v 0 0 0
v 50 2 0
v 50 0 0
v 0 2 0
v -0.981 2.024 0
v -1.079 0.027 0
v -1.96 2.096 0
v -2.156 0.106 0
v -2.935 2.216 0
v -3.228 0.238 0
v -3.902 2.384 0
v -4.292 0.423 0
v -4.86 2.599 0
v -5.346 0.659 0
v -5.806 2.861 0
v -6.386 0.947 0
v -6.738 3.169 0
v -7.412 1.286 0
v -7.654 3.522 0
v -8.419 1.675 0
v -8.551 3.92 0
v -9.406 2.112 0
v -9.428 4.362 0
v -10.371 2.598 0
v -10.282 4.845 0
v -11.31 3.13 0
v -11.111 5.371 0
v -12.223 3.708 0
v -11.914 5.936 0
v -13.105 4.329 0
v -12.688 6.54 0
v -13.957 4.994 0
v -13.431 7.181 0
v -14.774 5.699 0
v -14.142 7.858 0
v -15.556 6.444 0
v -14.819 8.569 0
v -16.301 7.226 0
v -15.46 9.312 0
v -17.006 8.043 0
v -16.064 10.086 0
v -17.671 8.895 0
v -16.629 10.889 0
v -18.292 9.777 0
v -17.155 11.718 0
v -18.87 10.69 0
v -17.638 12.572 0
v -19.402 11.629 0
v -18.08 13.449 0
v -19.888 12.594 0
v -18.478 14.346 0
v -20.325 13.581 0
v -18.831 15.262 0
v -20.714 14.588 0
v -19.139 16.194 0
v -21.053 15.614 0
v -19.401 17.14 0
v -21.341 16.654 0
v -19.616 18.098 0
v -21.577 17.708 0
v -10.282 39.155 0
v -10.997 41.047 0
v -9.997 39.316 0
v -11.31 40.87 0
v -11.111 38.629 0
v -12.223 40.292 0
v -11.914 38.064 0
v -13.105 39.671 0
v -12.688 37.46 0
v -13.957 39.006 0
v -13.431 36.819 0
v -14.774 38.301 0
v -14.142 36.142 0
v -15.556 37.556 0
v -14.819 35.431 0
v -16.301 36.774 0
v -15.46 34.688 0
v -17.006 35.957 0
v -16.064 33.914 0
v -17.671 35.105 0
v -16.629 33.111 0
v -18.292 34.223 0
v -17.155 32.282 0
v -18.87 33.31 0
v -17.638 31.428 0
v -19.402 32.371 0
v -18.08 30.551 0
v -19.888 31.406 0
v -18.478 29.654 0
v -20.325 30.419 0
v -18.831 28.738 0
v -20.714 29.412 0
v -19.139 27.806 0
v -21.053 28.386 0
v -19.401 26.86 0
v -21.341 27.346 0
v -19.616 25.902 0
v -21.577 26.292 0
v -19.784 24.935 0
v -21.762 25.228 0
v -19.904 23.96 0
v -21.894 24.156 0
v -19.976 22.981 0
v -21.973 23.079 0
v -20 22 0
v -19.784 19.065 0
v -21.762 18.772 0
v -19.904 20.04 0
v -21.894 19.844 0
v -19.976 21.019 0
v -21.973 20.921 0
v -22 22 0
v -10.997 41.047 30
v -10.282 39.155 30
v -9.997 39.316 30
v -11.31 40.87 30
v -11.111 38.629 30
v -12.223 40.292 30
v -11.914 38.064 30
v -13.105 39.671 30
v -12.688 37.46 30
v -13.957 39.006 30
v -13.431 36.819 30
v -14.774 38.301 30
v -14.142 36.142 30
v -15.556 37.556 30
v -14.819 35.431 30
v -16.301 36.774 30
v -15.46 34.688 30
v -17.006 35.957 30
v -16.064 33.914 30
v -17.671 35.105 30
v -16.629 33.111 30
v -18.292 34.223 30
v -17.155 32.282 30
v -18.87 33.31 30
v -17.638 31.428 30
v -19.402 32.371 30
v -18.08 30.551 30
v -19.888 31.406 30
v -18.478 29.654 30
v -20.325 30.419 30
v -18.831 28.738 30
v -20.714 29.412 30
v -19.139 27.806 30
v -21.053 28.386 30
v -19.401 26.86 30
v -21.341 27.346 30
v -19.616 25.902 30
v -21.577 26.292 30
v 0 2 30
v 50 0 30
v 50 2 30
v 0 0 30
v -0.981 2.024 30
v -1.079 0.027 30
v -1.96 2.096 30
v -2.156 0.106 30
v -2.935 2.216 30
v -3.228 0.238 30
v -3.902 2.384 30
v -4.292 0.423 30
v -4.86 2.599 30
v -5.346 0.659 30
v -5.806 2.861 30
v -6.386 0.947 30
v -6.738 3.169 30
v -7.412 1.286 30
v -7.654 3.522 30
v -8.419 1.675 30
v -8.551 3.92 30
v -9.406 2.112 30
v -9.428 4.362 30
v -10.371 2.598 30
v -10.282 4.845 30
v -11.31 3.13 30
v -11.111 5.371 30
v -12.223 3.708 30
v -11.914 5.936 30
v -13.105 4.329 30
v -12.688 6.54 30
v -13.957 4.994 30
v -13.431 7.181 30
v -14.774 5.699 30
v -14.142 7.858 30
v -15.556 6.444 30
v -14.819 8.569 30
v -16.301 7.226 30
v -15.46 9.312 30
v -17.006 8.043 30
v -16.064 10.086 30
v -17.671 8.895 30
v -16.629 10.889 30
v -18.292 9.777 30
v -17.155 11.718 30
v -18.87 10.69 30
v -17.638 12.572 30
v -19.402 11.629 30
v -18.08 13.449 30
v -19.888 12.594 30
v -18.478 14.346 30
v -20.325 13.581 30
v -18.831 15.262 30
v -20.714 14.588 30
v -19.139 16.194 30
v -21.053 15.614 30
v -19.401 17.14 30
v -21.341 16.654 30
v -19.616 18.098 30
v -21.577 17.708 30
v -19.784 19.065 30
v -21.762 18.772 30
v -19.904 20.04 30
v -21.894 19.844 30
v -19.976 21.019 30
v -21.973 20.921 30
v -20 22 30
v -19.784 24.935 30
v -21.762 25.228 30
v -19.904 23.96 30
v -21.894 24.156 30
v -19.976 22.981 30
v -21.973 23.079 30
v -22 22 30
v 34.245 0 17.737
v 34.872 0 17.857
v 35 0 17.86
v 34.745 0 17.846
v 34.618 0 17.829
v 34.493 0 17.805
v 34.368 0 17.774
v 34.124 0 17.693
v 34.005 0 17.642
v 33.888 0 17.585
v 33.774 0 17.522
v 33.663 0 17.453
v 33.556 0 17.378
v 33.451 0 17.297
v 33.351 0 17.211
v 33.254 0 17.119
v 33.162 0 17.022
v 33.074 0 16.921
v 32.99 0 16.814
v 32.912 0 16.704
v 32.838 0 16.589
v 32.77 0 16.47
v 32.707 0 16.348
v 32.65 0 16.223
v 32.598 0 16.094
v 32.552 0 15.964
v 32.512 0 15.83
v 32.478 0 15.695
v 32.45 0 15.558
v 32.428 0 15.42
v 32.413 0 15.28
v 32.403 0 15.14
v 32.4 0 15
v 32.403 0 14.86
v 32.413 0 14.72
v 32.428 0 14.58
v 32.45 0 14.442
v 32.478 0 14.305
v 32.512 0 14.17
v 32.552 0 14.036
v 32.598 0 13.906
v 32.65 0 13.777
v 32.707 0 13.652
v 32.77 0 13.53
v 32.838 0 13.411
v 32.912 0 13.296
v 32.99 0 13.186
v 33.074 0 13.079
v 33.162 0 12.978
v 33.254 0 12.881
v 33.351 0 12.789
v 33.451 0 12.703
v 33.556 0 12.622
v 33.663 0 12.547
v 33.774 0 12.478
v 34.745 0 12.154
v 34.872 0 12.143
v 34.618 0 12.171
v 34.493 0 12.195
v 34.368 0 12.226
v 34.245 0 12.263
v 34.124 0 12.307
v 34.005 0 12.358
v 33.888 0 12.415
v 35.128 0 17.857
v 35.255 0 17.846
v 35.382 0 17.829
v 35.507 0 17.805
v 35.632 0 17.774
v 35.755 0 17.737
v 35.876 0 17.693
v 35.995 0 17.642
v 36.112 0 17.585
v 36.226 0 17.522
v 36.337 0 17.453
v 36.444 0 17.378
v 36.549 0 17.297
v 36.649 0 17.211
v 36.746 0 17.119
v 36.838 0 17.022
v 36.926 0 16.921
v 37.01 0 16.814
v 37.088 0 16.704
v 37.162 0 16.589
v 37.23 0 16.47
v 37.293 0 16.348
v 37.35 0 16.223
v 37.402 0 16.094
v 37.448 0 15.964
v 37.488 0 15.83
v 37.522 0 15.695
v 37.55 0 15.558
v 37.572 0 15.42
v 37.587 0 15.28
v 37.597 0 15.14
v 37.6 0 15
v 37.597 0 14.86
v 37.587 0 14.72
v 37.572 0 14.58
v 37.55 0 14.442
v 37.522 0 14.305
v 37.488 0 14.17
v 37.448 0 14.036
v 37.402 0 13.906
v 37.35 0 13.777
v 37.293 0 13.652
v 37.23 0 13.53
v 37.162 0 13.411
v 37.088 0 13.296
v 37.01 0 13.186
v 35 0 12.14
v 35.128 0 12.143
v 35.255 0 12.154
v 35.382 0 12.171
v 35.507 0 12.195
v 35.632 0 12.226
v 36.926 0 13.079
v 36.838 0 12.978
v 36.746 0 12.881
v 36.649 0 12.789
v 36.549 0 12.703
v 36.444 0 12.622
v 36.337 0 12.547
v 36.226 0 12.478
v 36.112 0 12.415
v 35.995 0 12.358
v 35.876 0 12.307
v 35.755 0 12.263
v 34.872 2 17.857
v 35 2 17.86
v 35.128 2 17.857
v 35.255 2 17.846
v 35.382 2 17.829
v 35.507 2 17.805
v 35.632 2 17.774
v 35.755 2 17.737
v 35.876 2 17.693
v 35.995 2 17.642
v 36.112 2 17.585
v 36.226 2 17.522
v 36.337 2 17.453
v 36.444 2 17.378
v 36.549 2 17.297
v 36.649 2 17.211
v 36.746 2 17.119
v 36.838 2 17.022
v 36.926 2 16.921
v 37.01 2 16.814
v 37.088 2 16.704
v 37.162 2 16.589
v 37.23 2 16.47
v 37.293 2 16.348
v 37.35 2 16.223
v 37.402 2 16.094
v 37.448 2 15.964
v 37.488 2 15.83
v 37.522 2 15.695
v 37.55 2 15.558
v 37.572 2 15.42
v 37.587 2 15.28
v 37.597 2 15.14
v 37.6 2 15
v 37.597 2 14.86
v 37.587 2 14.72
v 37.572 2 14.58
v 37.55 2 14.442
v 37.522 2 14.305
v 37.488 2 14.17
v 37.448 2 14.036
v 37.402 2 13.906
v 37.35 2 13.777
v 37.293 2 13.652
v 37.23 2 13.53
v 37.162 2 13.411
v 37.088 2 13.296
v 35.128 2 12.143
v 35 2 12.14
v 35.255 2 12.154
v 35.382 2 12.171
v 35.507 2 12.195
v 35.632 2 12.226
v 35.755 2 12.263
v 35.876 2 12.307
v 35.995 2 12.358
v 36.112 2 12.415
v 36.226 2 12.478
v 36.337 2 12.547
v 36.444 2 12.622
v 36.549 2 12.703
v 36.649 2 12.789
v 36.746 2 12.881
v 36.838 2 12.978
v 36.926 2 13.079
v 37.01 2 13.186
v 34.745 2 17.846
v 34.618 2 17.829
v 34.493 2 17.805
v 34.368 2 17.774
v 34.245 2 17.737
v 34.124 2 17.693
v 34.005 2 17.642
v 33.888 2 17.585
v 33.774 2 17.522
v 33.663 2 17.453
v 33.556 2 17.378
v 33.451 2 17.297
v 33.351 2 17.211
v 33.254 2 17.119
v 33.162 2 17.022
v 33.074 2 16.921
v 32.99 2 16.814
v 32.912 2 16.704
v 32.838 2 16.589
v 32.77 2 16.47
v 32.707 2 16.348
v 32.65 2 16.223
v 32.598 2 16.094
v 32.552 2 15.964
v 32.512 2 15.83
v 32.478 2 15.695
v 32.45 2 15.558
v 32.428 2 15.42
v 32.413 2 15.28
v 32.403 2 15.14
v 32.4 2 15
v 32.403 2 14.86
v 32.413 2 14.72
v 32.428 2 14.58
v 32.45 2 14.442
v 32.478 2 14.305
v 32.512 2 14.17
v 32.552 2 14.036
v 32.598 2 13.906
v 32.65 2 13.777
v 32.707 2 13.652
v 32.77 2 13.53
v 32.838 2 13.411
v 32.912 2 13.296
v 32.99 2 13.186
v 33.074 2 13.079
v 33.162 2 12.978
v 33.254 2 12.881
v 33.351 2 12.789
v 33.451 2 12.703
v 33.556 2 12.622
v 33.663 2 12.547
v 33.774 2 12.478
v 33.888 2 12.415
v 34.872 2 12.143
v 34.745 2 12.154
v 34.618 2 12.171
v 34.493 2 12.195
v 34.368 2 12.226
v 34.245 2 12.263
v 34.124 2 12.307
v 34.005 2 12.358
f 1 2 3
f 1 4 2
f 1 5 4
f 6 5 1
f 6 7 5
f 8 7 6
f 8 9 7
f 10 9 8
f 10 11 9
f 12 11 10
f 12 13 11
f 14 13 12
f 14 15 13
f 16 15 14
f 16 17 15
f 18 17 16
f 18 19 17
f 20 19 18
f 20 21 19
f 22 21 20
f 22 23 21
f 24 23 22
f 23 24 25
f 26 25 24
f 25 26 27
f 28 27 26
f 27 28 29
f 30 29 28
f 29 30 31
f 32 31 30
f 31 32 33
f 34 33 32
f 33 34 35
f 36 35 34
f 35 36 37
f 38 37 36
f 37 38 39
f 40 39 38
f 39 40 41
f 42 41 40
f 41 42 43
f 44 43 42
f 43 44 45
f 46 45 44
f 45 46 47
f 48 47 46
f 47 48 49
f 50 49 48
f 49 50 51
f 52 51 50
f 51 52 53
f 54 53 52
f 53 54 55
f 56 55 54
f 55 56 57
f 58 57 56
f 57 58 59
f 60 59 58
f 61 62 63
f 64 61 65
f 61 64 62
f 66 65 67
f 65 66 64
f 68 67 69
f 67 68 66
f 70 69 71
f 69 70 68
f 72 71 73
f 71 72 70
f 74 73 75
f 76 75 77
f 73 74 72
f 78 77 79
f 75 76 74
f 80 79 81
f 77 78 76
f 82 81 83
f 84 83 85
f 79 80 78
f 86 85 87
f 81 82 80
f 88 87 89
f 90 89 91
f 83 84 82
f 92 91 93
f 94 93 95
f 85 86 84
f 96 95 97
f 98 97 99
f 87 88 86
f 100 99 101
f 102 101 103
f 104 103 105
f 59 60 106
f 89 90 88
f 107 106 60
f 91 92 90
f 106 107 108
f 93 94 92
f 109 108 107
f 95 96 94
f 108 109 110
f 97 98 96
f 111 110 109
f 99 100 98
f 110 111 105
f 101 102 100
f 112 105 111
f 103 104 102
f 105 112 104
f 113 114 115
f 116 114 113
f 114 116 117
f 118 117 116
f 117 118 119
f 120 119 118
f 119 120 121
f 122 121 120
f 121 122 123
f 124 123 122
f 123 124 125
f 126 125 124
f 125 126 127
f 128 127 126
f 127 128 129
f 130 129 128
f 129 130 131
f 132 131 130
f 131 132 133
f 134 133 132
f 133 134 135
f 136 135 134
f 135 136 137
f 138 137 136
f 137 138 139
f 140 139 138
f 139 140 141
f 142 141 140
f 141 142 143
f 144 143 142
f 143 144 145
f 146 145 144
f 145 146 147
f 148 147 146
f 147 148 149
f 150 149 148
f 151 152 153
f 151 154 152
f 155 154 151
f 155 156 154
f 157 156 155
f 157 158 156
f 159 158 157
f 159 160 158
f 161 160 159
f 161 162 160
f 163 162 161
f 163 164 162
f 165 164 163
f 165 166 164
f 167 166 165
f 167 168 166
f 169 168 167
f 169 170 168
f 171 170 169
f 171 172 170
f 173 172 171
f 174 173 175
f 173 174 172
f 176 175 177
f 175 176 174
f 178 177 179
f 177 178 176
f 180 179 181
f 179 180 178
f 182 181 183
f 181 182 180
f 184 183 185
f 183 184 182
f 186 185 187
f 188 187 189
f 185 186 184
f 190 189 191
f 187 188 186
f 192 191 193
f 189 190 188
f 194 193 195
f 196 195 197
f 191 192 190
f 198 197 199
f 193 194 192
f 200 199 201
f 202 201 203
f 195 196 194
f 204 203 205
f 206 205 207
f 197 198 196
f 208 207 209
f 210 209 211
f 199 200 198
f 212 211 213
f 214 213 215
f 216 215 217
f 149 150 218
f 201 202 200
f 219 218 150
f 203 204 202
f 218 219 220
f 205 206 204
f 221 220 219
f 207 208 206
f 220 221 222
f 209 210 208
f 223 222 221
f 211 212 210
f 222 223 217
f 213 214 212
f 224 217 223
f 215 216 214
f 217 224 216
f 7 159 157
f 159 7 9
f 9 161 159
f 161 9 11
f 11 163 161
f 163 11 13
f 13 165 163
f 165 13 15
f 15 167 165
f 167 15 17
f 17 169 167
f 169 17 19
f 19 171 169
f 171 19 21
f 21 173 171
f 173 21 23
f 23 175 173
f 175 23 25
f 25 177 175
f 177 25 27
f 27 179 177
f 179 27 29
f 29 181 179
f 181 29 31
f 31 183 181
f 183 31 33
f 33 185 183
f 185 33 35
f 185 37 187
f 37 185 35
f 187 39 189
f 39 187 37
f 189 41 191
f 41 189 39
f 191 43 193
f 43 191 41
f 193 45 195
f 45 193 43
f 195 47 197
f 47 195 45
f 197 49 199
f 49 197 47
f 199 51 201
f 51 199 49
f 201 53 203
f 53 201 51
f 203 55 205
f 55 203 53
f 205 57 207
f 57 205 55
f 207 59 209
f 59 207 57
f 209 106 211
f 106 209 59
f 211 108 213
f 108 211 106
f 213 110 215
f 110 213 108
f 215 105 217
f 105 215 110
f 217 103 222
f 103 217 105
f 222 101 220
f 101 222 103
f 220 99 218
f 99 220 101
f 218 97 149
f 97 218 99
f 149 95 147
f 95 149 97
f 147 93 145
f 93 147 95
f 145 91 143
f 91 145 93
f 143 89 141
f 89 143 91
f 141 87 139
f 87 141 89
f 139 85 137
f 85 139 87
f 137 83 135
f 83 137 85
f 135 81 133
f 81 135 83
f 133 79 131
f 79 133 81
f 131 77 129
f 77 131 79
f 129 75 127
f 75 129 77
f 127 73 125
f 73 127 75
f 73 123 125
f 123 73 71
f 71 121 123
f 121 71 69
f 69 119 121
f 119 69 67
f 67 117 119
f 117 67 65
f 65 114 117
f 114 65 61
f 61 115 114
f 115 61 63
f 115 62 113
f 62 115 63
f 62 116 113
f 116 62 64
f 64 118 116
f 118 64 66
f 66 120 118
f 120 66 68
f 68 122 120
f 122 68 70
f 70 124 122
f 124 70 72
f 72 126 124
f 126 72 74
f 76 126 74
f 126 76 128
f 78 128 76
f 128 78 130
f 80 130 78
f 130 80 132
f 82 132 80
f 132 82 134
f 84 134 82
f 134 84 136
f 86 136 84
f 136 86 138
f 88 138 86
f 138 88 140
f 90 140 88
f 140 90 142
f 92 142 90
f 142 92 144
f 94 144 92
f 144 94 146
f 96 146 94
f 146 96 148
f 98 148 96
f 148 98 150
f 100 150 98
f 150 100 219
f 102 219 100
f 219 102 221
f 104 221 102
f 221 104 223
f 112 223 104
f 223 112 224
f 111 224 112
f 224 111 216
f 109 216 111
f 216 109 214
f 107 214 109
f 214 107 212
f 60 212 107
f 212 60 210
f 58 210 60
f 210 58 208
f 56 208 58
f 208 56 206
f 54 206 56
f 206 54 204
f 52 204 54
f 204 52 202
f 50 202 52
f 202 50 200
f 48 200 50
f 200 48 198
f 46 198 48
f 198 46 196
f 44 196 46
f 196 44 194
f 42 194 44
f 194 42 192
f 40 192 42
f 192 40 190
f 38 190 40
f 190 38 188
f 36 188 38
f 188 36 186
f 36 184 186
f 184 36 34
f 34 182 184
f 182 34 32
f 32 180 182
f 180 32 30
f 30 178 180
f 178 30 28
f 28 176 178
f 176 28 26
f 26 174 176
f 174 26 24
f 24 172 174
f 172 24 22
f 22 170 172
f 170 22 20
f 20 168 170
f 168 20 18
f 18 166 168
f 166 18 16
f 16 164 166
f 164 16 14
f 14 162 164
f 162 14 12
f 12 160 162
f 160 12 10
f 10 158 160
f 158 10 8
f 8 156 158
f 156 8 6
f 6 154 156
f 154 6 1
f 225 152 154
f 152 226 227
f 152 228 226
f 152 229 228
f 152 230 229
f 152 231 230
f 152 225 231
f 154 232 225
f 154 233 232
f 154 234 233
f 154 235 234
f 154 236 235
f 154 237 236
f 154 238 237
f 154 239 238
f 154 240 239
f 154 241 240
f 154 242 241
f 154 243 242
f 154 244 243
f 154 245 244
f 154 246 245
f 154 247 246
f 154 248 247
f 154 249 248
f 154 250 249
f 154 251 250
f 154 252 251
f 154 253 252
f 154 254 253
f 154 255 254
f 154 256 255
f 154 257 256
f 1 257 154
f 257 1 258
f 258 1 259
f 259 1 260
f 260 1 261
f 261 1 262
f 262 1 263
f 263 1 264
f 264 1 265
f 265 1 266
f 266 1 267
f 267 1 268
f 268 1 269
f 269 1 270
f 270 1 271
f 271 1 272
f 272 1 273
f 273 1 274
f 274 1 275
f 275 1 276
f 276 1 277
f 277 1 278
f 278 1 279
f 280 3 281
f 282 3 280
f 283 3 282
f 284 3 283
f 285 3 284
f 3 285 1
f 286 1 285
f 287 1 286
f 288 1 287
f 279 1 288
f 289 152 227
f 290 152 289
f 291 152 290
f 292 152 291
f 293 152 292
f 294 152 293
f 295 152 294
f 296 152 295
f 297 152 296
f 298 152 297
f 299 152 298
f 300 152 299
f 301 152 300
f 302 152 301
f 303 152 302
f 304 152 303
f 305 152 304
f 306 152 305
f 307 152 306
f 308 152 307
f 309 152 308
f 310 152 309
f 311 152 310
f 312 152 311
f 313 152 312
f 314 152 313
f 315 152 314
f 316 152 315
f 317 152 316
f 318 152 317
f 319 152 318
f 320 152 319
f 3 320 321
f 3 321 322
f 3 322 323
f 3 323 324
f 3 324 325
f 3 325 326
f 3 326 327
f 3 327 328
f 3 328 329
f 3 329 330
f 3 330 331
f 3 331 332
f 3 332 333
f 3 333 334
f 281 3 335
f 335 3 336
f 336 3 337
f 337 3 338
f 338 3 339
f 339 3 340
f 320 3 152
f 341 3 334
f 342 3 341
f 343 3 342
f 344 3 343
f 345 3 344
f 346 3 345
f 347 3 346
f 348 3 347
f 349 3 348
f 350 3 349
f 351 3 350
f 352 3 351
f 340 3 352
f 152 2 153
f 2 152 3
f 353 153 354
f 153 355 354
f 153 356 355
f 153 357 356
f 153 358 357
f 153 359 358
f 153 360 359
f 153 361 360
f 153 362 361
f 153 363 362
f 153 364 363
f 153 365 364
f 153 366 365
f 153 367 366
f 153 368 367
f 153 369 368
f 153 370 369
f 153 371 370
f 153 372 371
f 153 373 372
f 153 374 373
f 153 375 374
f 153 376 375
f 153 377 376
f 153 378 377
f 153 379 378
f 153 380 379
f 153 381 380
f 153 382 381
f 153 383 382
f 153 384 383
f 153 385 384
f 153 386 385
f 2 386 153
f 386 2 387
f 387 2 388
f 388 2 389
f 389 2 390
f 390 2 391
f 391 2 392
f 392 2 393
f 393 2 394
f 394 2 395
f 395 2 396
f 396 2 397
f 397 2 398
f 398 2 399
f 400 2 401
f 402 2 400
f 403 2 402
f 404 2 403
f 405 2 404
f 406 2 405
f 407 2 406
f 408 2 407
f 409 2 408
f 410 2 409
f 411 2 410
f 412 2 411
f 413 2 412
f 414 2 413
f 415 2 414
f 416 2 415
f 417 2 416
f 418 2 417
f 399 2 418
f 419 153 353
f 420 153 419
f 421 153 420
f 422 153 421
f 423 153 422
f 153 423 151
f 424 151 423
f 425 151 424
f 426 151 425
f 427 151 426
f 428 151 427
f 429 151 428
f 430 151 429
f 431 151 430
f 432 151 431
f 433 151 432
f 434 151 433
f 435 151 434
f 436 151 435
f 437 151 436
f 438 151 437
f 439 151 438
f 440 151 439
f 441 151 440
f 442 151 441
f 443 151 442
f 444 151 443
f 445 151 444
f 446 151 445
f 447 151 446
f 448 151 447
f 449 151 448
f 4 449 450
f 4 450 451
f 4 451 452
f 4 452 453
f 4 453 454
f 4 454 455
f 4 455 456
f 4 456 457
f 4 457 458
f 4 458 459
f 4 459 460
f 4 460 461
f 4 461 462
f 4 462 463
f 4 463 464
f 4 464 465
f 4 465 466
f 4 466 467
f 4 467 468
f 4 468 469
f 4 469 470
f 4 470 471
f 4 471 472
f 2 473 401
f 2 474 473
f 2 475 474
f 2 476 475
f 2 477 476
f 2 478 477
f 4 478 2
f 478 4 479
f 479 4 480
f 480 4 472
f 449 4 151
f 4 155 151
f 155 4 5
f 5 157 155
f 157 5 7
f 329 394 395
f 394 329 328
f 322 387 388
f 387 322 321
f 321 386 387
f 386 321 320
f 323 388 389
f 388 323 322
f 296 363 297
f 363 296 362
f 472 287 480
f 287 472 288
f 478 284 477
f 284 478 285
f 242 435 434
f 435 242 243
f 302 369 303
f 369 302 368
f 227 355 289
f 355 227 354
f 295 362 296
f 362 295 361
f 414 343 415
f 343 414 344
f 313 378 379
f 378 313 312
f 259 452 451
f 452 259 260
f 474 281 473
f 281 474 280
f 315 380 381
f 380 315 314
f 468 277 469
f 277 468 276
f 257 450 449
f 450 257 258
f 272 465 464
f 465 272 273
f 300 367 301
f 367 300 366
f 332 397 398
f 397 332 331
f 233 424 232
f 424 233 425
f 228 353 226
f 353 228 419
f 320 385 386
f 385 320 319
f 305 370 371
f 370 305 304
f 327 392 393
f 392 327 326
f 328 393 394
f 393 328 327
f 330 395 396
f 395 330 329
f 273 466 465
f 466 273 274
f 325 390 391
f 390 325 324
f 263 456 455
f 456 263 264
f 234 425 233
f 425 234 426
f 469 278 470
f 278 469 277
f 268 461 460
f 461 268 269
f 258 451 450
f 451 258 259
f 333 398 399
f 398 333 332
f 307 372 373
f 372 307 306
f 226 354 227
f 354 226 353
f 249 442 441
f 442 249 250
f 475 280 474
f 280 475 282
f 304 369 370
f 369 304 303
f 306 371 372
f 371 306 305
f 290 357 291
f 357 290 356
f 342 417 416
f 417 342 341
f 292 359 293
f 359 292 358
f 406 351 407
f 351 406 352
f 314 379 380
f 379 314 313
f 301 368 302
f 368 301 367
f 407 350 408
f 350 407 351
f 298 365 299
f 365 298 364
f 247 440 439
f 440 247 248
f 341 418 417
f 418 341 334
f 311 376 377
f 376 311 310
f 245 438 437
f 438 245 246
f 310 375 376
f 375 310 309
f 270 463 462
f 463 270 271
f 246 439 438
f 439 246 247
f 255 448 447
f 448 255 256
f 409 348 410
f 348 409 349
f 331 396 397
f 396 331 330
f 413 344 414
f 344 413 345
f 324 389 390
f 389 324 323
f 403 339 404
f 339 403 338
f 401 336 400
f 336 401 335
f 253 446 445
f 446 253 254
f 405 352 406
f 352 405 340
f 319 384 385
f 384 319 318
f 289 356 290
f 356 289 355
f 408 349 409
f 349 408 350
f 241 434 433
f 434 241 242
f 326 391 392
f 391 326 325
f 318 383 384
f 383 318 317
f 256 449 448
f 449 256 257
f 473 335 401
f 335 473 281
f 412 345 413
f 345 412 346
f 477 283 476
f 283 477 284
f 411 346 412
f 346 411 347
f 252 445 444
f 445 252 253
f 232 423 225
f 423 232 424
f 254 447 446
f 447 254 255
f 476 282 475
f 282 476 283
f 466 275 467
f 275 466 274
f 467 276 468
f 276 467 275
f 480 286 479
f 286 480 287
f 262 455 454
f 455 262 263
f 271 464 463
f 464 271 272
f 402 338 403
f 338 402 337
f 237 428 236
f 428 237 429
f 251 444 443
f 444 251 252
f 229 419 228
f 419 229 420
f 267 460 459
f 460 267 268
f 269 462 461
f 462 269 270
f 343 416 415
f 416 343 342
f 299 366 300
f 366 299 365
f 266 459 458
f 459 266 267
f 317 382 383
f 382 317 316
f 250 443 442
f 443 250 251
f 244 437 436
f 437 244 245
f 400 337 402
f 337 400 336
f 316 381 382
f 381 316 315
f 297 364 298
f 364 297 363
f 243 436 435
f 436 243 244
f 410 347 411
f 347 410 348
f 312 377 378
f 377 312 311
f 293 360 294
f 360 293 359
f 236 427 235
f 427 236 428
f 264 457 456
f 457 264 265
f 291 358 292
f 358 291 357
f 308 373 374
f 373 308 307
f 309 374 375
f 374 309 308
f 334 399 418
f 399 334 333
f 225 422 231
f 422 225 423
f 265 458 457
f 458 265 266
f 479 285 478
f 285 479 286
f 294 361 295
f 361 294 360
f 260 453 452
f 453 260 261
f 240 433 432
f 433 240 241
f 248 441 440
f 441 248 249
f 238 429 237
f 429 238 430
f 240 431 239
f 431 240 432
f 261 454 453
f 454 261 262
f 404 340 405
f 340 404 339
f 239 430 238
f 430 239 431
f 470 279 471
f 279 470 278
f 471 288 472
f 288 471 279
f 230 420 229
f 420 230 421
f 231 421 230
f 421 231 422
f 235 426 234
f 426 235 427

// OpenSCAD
$fn = 128;

t = 2.0;
r = 22;
h = 30;
l = 50;

module sector(radius, angles) {
    r = radius / cos(180 / $fn);
    step = -360 / $fn;

    points = concat([[0, 0]],
        [for(a = [angles[0] : step : angles[1] - 360]) 
            [r * cos(a), r * sin(a)]
        ],
        [[r * cos(angles[1]), r * sin(angles[1])]]
    );

    difference() {
        circle(radius);
        polygon(points);
    }
}

module arc(radius, angles, width = t) {
    difference() {
        sector(radius, angles);
        sector(radius - width, angles);
    }
}


difference() {
    linear_extrude(height=h) {
        translate([0, r]) arc(r, [120, 270]);
        square([l, t]);
    }
    translate([l-15, 0, h/2])
    rotate([-90, 0, 0]) scale([1, 1.1, 1]) cylinder(h=t, d=5.2);
}
